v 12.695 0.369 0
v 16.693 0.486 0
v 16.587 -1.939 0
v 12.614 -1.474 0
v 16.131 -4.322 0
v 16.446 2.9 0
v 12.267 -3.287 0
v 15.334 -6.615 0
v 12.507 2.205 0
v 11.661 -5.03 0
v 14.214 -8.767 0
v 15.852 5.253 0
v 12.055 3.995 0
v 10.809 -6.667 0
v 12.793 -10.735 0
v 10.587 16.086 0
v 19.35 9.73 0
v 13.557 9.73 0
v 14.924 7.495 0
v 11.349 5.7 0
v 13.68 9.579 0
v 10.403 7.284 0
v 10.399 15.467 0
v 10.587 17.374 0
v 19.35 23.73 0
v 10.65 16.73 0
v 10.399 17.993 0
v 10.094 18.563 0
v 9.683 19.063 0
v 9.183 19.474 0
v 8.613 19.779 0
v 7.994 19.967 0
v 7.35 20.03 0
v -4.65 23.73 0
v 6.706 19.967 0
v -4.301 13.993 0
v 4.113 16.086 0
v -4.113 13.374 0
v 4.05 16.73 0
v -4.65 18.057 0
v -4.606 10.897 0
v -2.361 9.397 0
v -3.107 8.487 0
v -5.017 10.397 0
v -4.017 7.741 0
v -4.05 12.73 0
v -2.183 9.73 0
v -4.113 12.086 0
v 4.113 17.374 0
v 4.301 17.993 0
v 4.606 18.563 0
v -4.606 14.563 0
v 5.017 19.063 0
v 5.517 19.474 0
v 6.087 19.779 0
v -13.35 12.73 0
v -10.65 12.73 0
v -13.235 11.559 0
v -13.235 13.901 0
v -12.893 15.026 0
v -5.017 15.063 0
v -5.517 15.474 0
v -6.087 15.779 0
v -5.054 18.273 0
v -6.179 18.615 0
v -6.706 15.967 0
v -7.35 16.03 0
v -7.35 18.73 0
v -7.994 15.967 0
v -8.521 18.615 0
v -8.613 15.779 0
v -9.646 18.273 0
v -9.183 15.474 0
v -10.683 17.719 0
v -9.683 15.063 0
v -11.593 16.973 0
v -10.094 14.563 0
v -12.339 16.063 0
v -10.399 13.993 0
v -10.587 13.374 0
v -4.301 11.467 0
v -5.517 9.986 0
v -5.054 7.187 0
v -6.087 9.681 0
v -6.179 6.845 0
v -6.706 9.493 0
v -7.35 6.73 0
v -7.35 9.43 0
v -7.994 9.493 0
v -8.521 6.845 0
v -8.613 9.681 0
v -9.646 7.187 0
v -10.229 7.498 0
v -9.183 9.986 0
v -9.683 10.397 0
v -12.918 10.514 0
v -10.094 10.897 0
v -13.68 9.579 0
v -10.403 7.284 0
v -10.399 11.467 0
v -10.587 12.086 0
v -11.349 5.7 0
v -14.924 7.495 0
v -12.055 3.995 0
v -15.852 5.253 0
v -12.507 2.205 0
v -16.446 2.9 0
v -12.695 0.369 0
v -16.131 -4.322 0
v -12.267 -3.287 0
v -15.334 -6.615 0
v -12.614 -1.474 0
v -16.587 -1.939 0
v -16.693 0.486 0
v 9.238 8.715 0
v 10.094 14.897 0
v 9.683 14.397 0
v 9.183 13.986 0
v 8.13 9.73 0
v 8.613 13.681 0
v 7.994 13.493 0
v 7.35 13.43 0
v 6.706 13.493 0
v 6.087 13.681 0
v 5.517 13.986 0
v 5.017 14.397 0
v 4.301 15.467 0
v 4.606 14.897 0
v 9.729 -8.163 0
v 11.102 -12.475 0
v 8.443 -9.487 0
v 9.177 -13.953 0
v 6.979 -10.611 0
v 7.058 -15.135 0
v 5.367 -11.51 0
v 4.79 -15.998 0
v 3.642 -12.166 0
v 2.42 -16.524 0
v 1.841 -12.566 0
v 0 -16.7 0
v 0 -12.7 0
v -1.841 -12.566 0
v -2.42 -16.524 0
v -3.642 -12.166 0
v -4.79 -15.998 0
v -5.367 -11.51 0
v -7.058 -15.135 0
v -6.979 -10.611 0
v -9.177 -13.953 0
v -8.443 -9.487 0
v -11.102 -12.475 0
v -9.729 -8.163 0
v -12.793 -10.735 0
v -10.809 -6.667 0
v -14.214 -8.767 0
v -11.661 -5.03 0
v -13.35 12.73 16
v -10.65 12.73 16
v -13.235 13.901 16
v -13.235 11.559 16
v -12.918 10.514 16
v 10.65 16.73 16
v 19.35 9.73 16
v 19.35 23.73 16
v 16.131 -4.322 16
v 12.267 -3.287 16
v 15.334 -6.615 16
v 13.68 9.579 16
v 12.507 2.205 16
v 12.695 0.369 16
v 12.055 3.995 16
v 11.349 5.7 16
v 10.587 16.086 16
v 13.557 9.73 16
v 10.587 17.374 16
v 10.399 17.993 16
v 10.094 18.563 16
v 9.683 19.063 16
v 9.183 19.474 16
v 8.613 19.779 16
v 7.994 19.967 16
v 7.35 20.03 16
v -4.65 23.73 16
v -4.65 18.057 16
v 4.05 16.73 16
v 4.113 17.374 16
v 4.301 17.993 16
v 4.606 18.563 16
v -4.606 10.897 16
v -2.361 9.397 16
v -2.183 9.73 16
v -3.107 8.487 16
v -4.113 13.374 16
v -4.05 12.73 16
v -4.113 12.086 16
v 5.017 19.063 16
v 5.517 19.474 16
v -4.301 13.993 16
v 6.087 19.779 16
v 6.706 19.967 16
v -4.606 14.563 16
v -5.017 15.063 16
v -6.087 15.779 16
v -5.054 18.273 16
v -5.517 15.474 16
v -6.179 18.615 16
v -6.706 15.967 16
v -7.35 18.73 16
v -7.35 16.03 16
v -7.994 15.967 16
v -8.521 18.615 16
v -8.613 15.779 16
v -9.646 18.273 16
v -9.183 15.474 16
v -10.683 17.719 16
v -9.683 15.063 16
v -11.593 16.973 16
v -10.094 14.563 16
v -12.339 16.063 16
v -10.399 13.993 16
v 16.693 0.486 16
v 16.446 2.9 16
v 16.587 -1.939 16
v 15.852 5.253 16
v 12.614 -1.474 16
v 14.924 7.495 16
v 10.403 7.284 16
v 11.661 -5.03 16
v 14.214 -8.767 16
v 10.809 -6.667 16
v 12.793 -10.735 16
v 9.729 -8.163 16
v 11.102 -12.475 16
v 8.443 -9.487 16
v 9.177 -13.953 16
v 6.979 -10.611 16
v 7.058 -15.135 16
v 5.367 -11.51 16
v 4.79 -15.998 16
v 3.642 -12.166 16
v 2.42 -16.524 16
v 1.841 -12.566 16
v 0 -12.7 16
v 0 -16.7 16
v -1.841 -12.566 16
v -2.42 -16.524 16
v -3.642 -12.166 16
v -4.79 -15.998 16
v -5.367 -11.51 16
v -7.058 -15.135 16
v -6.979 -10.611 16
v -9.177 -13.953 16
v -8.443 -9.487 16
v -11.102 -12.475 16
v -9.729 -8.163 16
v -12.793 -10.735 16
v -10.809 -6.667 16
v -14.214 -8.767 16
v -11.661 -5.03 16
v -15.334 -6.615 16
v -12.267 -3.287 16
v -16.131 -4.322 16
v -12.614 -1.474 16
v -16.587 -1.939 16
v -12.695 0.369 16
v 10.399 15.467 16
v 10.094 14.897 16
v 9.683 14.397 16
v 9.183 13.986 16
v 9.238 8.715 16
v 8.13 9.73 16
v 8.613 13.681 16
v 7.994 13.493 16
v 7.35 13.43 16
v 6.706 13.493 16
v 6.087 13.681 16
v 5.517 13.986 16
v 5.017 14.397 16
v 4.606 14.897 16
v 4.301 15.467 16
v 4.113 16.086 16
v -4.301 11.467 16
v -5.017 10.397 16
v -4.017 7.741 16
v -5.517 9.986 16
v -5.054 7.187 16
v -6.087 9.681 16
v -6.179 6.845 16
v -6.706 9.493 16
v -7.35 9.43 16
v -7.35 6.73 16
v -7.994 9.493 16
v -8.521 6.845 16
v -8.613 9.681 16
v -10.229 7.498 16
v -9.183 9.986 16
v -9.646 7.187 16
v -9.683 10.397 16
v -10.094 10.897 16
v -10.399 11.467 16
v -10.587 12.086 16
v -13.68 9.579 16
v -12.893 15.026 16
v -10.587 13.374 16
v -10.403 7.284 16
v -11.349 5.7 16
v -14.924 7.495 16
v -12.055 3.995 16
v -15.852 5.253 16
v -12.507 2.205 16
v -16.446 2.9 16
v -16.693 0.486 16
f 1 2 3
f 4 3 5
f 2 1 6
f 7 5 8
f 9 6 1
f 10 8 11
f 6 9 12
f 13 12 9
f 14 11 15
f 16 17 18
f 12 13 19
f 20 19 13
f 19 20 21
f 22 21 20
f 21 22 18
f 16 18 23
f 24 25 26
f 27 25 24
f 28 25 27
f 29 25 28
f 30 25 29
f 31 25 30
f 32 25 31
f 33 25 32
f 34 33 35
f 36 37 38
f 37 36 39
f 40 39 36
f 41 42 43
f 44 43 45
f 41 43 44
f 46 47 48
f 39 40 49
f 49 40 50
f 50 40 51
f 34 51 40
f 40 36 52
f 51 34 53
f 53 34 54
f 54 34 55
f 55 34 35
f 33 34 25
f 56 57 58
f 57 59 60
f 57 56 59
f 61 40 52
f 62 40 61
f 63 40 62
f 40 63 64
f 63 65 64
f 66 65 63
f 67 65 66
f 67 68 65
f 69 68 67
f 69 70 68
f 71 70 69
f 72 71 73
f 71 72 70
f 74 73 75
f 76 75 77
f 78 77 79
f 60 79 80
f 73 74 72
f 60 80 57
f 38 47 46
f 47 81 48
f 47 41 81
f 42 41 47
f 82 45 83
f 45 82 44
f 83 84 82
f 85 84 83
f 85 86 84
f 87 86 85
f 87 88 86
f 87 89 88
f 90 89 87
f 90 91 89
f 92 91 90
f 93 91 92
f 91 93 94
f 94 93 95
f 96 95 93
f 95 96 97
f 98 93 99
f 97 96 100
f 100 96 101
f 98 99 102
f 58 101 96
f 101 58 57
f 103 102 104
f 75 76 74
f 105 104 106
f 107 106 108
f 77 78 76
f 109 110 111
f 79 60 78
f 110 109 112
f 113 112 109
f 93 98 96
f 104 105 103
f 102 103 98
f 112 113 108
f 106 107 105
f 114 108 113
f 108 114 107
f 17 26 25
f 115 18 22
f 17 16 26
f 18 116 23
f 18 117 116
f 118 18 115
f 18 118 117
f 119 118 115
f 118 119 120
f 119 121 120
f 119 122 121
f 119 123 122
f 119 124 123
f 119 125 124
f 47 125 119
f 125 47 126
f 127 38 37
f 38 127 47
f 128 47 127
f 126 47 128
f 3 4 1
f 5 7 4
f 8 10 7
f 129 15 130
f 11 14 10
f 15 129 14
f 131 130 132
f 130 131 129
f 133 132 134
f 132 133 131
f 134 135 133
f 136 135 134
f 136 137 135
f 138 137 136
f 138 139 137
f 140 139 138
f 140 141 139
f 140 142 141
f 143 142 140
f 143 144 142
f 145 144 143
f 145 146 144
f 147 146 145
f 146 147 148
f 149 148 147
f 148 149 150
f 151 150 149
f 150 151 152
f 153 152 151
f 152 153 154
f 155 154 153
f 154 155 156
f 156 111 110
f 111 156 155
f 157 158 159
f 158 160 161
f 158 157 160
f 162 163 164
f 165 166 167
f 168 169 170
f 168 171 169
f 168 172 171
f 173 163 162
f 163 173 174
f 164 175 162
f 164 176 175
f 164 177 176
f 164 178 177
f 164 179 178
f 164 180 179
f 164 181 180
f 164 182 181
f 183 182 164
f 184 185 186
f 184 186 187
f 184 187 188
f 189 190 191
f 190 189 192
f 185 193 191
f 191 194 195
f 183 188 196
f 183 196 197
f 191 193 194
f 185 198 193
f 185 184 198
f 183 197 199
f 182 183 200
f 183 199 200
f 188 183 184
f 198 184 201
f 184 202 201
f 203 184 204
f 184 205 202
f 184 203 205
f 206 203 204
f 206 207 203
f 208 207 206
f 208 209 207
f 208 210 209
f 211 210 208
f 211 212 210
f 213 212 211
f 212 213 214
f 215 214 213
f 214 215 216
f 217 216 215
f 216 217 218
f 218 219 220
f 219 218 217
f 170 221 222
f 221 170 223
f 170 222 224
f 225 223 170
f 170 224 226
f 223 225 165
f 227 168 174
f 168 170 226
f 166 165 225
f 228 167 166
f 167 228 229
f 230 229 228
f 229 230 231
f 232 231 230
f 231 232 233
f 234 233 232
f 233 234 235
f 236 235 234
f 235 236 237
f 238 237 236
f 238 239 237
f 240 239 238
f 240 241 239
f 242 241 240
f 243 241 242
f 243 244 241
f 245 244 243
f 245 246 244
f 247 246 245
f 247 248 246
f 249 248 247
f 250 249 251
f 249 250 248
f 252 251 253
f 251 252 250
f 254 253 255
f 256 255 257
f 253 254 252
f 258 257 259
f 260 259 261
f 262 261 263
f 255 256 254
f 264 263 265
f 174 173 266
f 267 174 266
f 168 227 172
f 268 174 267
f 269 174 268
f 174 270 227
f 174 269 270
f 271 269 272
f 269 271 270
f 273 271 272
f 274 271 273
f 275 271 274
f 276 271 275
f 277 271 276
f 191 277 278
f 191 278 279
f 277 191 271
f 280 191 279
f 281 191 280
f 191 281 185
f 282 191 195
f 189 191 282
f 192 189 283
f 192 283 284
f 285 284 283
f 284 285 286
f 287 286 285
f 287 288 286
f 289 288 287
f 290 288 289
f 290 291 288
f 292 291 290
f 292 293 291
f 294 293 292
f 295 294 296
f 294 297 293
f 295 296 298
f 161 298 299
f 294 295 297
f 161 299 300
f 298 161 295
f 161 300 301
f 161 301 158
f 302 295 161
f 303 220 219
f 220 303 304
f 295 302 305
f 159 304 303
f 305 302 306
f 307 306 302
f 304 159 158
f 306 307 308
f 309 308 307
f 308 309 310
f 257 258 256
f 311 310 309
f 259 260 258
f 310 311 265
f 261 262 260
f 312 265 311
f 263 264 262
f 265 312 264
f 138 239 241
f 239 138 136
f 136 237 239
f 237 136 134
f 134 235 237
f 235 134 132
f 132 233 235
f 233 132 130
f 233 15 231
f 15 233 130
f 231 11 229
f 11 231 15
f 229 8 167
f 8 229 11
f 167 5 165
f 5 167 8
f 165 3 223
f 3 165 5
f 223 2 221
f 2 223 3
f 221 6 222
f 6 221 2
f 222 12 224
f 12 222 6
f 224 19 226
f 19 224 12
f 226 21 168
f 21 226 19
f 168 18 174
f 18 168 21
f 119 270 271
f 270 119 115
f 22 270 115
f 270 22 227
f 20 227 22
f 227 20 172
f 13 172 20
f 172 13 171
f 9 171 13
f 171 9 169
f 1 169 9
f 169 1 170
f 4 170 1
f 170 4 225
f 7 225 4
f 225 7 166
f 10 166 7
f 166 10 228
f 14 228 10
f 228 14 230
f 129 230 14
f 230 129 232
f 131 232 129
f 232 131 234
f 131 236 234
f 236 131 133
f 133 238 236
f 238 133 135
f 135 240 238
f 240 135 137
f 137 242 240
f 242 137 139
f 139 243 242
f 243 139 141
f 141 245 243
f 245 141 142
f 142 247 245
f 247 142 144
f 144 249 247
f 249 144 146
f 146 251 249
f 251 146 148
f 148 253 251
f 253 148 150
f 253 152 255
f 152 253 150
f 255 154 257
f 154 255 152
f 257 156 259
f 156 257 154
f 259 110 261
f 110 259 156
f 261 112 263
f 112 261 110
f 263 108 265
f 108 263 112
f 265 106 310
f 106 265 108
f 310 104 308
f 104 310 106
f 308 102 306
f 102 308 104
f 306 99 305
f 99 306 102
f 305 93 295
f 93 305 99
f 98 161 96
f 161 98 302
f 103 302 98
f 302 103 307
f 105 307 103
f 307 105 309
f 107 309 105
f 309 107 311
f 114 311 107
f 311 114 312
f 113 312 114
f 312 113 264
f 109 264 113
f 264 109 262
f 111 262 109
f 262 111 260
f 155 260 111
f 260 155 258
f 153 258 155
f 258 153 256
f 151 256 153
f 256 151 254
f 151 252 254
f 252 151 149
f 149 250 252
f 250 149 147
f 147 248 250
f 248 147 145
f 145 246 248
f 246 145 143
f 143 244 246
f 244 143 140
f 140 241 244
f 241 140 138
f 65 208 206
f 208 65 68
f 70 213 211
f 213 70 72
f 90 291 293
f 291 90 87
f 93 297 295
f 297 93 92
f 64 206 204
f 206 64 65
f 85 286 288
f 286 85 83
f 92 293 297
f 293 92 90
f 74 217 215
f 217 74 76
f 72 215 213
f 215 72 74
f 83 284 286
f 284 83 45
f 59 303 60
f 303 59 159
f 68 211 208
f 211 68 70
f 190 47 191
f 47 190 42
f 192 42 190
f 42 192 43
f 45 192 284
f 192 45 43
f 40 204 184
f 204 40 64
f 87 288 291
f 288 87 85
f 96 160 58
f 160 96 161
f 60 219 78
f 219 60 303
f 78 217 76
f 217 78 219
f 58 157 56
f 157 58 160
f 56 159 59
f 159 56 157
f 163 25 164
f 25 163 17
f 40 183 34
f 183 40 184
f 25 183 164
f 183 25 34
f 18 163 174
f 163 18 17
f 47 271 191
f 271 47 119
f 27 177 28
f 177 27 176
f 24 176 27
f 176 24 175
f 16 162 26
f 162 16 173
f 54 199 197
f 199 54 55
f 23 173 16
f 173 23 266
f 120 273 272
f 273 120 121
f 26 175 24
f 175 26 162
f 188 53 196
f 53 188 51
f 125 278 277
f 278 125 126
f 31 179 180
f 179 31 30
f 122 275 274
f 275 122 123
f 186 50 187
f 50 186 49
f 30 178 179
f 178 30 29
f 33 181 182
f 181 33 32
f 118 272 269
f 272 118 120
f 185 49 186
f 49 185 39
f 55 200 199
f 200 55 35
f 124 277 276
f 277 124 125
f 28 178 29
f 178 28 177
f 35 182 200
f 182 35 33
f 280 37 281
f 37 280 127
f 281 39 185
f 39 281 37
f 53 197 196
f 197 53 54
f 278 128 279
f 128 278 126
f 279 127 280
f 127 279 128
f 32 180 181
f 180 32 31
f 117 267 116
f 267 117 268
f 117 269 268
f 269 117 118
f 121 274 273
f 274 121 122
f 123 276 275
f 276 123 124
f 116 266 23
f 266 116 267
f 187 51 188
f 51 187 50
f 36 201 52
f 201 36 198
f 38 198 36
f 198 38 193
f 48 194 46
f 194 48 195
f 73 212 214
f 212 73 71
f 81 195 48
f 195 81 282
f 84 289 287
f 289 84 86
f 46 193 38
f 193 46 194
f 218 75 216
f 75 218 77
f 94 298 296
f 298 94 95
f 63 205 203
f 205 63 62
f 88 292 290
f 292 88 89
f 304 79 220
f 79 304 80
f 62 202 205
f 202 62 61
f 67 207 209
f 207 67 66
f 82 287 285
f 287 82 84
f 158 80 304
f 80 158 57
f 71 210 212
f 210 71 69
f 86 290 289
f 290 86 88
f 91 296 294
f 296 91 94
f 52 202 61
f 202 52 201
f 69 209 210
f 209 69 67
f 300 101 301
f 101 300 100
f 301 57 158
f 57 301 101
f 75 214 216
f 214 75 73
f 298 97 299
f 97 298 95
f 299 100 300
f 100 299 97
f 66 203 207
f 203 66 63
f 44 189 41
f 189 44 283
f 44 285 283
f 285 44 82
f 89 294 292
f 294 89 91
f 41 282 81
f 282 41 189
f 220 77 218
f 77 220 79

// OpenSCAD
$fn = 32;

// ----------------------------------------------------------------------
// Pipe clamp: 33.4 mm ring, 4 mm wall, 16 mm wide
// ----------------------------------------------------------------------

// --- parameters (mm) ---
outer_r = 16.7;           // clamp outside radius
inner_r = 12.7;           // pipe bore radius
band = 4;                 // band thickness
clamp_w = 16;             // clamp width
opening = 60;             // opening angle between the ends
lug_w = 24;               // lug width
lug_len = 14;             // lug length
bolt_d = 6.6;             // bolt hole
knuckle_d = 12;           // hinge knuckle diameter
pin_d = 6.6;              // hinge pin hole

clamp_profile = [[-8.35, 14.463], [-10.358, 13.1], [-12.147, 11.46], [-13.68, 9.579], [-14.924, 7.495], [-15.852, 5.253], [-16.446, 2.9], [-16.693, 0.486], [-16.587, -1.939], [-16.131, -4.322], [-15.334, -6.615], [-14.214, -8.767], [-12.793, -10.735], [-11.102, -12.475], [-9.177, -13.953], [-7.058, -15.135], [-4.79, -15.998], [-2.42, -16.524], [0, -16.7], [2.42, -16.524], [4.79, -15.998], [7.058, -15.135], [9.177, -13.953], [11.102, -12.475], [12.793, -10.735], [14.214, -8.767], [15.334, -6.615], [16.131, -4.322], [16.587, -1.939], [16.693, 0.486], [16.446, 2.9], [15.852, 5.253], [14.924, 7.495], [13.68, 9.579], [12.147, 11.46], [10.358, 13.1], [8.35, 14.463], [6.35, 10.999], [7.877, 9.962], [9.238, 8.715], [10.403, 7.284], [11.349, 5.7], [12.055, 3.995], [12.507, 2.205], [12.695, 0.369], [12.614, -1.474], [12.267, -3.287], [11.661, -5.03], [10.809, -6.667], [9.729, -8.163], [8.443, -9.487], [6.979, -10.611], [5.367, -11.51], [3.642, -12.166], [1.841, -12.566], [0, -12.7], [-1.841, -12.566], [-3.642, -12.166], [-5.367, -11.51], [-6.979, -10.611], [-8.443, -9.487], [-9.729, -8.163], [-10.809, -6.667], [-11.661, -5.03], [-12.267, -3.287], [-12.614, -1.474], [-12.695, 0.369], [-12.507, 2.205], [-12.055, 3.995], [-11.349, 5.7], [-10.403, 7.284], [-9.238, 8.715], [-7.877, 9.962], [-6.35, 10.999]];

difference() {
  union() {
    linear_extrude(height = clamp_w) polygon(clamp_profile);
    /* hinge knuckle, sunk 2 mm into the band end */
    translate([-7.35, 12.73, 0]) cylinder(h = clamp_w, d = knuckle_d);
    /* bolt lug on the other end */
    translate([-4.65, 9.73, 0]) cube([lug_w, 14, clamp_w]);
  }
  translate([7.35, 16.73, -2.5]) cylinder(h = clamp_w + 5, d = bolt_d);
  translate([-7.35, 12.73, -2.5]) cylinder(h = clamp_w + 5, d = pin_d);
}
